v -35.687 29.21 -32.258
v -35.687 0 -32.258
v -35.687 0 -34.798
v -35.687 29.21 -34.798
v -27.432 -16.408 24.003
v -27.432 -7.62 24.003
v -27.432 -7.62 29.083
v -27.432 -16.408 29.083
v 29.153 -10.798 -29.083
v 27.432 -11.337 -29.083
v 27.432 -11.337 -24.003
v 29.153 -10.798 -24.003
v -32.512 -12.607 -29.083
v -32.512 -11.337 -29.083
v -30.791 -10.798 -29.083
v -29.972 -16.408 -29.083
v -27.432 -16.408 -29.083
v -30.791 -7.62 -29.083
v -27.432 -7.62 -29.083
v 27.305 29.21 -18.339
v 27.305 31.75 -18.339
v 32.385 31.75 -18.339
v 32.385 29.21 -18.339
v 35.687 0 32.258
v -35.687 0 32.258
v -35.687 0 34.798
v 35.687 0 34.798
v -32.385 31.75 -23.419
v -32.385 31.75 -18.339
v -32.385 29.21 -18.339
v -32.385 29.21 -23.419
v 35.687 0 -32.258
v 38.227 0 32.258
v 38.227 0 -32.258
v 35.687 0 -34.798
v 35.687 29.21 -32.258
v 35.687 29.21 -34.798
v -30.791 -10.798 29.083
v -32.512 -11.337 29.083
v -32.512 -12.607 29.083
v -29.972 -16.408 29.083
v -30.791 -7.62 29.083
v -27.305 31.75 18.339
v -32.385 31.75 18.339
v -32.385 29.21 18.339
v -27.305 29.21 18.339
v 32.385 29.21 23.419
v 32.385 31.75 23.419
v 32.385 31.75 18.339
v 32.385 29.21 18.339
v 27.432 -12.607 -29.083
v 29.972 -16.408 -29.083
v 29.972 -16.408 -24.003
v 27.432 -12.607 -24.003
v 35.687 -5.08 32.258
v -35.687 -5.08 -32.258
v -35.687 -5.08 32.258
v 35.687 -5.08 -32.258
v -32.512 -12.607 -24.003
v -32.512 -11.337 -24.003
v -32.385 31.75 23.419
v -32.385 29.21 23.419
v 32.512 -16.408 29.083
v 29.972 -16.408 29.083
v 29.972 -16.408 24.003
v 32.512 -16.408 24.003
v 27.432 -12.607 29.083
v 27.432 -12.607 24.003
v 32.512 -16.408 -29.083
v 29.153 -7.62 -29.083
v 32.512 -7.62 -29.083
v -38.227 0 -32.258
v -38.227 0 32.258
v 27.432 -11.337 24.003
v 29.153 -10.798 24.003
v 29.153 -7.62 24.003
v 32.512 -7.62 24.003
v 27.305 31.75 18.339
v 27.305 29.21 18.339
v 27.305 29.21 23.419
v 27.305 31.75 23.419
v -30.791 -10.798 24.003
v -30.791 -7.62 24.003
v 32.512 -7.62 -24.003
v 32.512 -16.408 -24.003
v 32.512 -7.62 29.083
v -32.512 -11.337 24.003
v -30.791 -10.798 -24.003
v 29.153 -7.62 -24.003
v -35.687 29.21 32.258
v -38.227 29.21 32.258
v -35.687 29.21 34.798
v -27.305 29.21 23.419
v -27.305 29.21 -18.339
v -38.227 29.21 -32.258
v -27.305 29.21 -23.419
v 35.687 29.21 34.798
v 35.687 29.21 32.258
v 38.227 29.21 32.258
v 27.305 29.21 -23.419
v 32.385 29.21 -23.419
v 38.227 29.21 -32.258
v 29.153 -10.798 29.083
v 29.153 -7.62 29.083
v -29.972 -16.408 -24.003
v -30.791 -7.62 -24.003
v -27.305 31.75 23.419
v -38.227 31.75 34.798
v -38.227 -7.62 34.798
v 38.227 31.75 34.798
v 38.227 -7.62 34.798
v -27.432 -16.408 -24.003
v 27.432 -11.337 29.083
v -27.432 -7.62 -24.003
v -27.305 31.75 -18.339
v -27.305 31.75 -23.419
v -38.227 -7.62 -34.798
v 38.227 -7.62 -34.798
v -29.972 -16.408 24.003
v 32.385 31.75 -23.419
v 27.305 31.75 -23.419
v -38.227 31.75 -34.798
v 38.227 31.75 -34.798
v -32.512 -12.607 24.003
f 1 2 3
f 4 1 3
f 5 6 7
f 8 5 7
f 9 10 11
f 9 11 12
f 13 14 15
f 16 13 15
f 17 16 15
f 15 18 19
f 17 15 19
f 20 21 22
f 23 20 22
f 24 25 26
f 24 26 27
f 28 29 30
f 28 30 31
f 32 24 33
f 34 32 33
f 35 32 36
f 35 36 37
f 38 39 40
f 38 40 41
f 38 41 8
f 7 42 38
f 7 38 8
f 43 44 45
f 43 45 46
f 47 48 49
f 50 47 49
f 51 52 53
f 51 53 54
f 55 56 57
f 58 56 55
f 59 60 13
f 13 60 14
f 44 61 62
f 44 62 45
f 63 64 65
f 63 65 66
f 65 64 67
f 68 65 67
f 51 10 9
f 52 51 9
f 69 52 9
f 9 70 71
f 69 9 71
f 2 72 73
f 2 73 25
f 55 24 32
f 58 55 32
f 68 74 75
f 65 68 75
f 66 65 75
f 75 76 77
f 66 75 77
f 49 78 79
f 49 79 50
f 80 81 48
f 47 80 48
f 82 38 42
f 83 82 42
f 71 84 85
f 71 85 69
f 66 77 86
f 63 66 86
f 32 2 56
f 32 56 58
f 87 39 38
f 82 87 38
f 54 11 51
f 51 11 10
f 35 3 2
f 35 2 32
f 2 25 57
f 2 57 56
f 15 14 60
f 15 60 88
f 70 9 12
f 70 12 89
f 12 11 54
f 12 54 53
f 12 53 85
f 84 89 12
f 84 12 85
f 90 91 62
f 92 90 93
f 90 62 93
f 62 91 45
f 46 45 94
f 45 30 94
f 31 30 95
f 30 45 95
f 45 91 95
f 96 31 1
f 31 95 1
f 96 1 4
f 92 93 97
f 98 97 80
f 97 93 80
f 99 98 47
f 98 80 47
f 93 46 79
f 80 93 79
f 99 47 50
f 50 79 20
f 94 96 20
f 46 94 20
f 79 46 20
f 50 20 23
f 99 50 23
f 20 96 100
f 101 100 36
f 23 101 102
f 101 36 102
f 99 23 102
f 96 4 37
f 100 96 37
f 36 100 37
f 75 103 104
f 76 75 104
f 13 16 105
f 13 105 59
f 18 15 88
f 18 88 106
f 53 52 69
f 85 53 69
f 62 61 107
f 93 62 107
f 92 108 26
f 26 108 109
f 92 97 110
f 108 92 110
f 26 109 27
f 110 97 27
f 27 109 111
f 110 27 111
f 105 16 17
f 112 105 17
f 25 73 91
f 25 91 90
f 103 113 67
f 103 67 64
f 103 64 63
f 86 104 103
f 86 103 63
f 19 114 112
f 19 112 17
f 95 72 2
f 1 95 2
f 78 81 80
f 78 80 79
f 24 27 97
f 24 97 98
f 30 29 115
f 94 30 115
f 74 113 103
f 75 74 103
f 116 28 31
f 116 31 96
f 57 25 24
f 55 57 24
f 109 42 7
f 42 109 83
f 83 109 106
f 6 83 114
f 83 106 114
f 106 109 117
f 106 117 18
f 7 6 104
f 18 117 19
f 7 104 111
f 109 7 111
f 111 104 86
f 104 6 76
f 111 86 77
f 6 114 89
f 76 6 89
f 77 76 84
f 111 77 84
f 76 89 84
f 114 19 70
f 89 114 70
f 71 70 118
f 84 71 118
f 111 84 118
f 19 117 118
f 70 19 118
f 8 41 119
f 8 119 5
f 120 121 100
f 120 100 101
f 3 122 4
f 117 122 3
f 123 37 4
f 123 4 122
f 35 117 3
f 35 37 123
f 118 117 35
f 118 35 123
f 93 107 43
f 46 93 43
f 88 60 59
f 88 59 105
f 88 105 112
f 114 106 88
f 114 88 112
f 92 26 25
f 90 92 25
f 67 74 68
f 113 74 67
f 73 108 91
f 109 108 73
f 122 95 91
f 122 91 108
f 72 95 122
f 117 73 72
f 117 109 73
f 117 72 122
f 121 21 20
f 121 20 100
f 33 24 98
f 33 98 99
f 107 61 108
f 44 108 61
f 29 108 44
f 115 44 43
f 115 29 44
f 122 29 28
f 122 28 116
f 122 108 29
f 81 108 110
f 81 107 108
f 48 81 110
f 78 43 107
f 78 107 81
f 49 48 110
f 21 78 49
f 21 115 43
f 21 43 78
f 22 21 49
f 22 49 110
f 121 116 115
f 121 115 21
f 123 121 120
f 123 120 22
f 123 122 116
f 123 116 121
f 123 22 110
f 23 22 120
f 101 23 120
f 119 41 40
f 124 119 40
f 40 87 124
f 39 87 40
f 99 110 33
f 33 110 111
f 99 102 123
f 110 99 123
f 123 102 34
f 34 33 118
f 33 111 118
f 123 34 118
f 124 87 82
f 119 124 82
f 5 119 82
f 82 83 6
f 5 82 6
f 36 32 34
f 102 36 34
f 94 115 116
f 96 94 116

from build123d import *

# Parameters (mm, degrees)
SKETCH1_W           = 76.454
SKETCH1_H           = 69.596
BOSS_EXTRUDE1_DEPTH = 7.62
SKETCH2_W           = 71.374
SKETCH2_H           = 64.516
CUT_EXTRUDE1_DEPTH  = 5.08
SKETCH4_W           = 5.08
SKETCH4_H           = 5.08
BOSS_EXTRUDE2_DEPTH = 8.7884
CUT_EXTRUDE2_DEPTH  = 5.08
SKETCH6_W           = 2.54
SKETCH6_H           = 2.54
BOSS_EXTRUDE3_DEPTH = 29.21
SKETCH7_W           = 76.454
SKETCH7_H           = 69.596
BOSS_EXTRUDE4_DEPTH = 2.54
CUT_EXTRUDE3_REACH  = 50.158
SKETCH8_W           = 5.08
SKETCH8_H           = 5.08


with BuildPart() as part:
    # Sketch1 → Boss-Extrude1 (new body)
    with BuildSketch(Plane(origin=(0, 0, 0), x_dir=(1, 0, 0), z_dir=(0, 1, 0))):
        Rectangle(SKETCH1_W, SKETCH1_H)
    extrude(amount=-BOSS_EXTRUDE1_DEPTH)

    # Sketch2 → Cut-Extrude1 (cut)
    with BuildSketch(Plane(origin=(0, 0, 0), x_dir=(1, 0, 0), z_dir=(0, 1, 0))):
        Rectangle(SKETCH2_W, SKETCH2_H)
    extrude(amount=-CUT_EXTRUDE1_DEPTH, mode=Mode.SUBTRACT)

    # Sketch4 → Boss-Extrude2 (add)
    with BuildSketch(Plane.XZ.offset(7.62)):
        with Locations((-29.972, 26.543)):
            Rectangle(SKETCH4_W, SKETCH4_H)
        with Locations((29.972, 26.543)):
            Rectangle(SKETCH4_W, SKETCH4_H)
    boss_extrude2 = extrude(amount=BOSS_EXTRUDE2_DEPTH)

    # Sketch5 → Cut-Extrude2 (cut)
    with BuildSketch(Plane.XY.offset(29.083)):
        Polygon((29.972, -16.4084), (27.432, -12.606876095), (27.432, -16.4084), align=None)
        Polygon((-29.972, -16.4084), (-32.512, -12.606876095), (-32.512, -16.4084), align=None)
        Polygon((27.432, -11.336876095), (29.153074553, -10.798216701), (29.153074553, -7.62), (27.432, -7.62), align=None)
        Polygon((-32.512, -11.336876095), (-30.790925447, -10.798216701), (-30.790925447, -7.62), (-32.512, -7.62), align=None)
    cut_extrude2 = extrude(amount=-CUT_EXTRUDE2_DEPTH, mode=Mode.SUBTRACT)

    # Mirror1: Boss-Extrude2, Cut-Extrude2 across plane
    add(boss_extrude2.mirror(Plane.XY))
    add(cut_extrude2.mirror(Plane.XY), mode=Mode.SUBTRACT)

    # Sketch6 → Boss-Extrude3 (add)
    with BuildSketch(Plane(origin=(0, 0, 0), x_dir=(1, 0, 0), z_dir=(0, 1, 0))):
        with Locations((-36.957, 33.528)):
            Rectangle(SKETCH6_W, SKETCH6_H)
        with Locations((-36.957, -33.528)):
            Rectangle(SKETCH6_W, SKETCH6_H)
        with Locations((36.957, -33.528)):
            Rectangle(SKETCH6_W, SKETCH6_H)
        with Locations((36.957, 33.528)):
            Rectangle(SKETCH6_W, SKETCH6_H)
    extrude(amount=BOSS_EXTRUDE3_DEPTH)

    # Sketch7 → Boss-Extrude4 (add)
    with BuildSketch(Plane(origin=(0, 29.21, 0), x_dir=(1, 0, 0), z_dir=(0, 1, 0))):
        Rectangle(SKETCH7_W, SKETCH7_H)
    extrude(amount=BOSS_EXTRUDE4_DEPTH)

    # Sketch8 → Cut-Extrude3 (cut, up to next)
    with BuildSketch(Plane(origin=(0, 31.75, 0), x_dir=(1, 0, 0), z_dir=(0, 1, 0)), mode=Mode.PRIVATE) as cut_extrude3_sk1:
        with Locations((29.845, 20.8788)):
            Rectangle(SKETCH8_W, SKETCH8_H)
    cut_extrude3_tool1 = extrude(cut_extrude3_sk1.sketch, amount=-CUT_EXTRUDE3_REACH, mode=Mode.PRIVATE) & part.part
    add(cut_extrude3_tool1.solids().sort_by_distance((29.845, 31.75, -20.8788))[0], mode=Mode.SUBTRACT)
    # Sketch8 → Cut-Extrude3 (cut, up to next)
    with BuildSketch(Plane(origin=(0, 31.75, 0), x_dir=(1, 0, 0), z_dir=(0, 1, 0)), mode=Mode.PRIVATE) as cut_extrude3_sk2:
        with Locations((-29.845, 20.8788)):
            Rectangle(SKETCH8_W, SKETCH8_H)
    cut_extrude3_tool2 = extrude(cut_extrude3_sk2.sketch, amount=-CUT_EXTRUDE3_REACH, mode=Mode.PRIVATE) & part.part
    add(cut_extrude3_tool2.solids().sort_by_distance((-29.845, 31.75, -20.8788))[0], mode=Mode.SUBTRACT)
    # Sketch8 → Cut-Extrude3 (cut, up to next)
    with BuildSketch(Plane(origin=(0, 31.75, 0), x_dir=(1, 0, 0), z_dir=(0, 1, 0)), mode=Mode.PRIVATE) as cut_extrude3_sk3:
        with Locations((29.845, -20.8788)):
            Rectangle(SKETCH8_W, SKETCH8_H)
    cut_extrude3_tool3 = extrude(cut_extrude3_sk3.sketch, amount=-CUT_EXTRUDE3_REACH, mode=Mode.PRIVATE) & part.part
    add(cut_extrude3_tool3.solids().sort_by_distance((29.845, 31.75, 20.8788))[0], mode=Mode.SUBTRACT)
    # Sketch8 → Cut-Extrude3 (cut, up to next)
    with BuildSketch(Plane(origin=(0, 31.75, 0), x_dir=(1, 0, 0), z_dir=(0, 1, 0)), mode=Mode.PRIVATE) as cut_extrude3_sk4:
        with Locations((-29.845, -20.8788)):
            Rectangle(SKETCH8_W, SKETCH8_H)
    cut_extrude3_tool4 = extrude(cut_extrude3_sk4.sketch, amount=-CUT_EXTRUDE3_REACH, mode=Mode.PRIVATE) & part.part
    add(cut_extrude3_tool4.solids().sort_by_distance((-29.845, 31.75, 20.8788))[0], mode=Mode.SUBTRACT)


solid = part.part
